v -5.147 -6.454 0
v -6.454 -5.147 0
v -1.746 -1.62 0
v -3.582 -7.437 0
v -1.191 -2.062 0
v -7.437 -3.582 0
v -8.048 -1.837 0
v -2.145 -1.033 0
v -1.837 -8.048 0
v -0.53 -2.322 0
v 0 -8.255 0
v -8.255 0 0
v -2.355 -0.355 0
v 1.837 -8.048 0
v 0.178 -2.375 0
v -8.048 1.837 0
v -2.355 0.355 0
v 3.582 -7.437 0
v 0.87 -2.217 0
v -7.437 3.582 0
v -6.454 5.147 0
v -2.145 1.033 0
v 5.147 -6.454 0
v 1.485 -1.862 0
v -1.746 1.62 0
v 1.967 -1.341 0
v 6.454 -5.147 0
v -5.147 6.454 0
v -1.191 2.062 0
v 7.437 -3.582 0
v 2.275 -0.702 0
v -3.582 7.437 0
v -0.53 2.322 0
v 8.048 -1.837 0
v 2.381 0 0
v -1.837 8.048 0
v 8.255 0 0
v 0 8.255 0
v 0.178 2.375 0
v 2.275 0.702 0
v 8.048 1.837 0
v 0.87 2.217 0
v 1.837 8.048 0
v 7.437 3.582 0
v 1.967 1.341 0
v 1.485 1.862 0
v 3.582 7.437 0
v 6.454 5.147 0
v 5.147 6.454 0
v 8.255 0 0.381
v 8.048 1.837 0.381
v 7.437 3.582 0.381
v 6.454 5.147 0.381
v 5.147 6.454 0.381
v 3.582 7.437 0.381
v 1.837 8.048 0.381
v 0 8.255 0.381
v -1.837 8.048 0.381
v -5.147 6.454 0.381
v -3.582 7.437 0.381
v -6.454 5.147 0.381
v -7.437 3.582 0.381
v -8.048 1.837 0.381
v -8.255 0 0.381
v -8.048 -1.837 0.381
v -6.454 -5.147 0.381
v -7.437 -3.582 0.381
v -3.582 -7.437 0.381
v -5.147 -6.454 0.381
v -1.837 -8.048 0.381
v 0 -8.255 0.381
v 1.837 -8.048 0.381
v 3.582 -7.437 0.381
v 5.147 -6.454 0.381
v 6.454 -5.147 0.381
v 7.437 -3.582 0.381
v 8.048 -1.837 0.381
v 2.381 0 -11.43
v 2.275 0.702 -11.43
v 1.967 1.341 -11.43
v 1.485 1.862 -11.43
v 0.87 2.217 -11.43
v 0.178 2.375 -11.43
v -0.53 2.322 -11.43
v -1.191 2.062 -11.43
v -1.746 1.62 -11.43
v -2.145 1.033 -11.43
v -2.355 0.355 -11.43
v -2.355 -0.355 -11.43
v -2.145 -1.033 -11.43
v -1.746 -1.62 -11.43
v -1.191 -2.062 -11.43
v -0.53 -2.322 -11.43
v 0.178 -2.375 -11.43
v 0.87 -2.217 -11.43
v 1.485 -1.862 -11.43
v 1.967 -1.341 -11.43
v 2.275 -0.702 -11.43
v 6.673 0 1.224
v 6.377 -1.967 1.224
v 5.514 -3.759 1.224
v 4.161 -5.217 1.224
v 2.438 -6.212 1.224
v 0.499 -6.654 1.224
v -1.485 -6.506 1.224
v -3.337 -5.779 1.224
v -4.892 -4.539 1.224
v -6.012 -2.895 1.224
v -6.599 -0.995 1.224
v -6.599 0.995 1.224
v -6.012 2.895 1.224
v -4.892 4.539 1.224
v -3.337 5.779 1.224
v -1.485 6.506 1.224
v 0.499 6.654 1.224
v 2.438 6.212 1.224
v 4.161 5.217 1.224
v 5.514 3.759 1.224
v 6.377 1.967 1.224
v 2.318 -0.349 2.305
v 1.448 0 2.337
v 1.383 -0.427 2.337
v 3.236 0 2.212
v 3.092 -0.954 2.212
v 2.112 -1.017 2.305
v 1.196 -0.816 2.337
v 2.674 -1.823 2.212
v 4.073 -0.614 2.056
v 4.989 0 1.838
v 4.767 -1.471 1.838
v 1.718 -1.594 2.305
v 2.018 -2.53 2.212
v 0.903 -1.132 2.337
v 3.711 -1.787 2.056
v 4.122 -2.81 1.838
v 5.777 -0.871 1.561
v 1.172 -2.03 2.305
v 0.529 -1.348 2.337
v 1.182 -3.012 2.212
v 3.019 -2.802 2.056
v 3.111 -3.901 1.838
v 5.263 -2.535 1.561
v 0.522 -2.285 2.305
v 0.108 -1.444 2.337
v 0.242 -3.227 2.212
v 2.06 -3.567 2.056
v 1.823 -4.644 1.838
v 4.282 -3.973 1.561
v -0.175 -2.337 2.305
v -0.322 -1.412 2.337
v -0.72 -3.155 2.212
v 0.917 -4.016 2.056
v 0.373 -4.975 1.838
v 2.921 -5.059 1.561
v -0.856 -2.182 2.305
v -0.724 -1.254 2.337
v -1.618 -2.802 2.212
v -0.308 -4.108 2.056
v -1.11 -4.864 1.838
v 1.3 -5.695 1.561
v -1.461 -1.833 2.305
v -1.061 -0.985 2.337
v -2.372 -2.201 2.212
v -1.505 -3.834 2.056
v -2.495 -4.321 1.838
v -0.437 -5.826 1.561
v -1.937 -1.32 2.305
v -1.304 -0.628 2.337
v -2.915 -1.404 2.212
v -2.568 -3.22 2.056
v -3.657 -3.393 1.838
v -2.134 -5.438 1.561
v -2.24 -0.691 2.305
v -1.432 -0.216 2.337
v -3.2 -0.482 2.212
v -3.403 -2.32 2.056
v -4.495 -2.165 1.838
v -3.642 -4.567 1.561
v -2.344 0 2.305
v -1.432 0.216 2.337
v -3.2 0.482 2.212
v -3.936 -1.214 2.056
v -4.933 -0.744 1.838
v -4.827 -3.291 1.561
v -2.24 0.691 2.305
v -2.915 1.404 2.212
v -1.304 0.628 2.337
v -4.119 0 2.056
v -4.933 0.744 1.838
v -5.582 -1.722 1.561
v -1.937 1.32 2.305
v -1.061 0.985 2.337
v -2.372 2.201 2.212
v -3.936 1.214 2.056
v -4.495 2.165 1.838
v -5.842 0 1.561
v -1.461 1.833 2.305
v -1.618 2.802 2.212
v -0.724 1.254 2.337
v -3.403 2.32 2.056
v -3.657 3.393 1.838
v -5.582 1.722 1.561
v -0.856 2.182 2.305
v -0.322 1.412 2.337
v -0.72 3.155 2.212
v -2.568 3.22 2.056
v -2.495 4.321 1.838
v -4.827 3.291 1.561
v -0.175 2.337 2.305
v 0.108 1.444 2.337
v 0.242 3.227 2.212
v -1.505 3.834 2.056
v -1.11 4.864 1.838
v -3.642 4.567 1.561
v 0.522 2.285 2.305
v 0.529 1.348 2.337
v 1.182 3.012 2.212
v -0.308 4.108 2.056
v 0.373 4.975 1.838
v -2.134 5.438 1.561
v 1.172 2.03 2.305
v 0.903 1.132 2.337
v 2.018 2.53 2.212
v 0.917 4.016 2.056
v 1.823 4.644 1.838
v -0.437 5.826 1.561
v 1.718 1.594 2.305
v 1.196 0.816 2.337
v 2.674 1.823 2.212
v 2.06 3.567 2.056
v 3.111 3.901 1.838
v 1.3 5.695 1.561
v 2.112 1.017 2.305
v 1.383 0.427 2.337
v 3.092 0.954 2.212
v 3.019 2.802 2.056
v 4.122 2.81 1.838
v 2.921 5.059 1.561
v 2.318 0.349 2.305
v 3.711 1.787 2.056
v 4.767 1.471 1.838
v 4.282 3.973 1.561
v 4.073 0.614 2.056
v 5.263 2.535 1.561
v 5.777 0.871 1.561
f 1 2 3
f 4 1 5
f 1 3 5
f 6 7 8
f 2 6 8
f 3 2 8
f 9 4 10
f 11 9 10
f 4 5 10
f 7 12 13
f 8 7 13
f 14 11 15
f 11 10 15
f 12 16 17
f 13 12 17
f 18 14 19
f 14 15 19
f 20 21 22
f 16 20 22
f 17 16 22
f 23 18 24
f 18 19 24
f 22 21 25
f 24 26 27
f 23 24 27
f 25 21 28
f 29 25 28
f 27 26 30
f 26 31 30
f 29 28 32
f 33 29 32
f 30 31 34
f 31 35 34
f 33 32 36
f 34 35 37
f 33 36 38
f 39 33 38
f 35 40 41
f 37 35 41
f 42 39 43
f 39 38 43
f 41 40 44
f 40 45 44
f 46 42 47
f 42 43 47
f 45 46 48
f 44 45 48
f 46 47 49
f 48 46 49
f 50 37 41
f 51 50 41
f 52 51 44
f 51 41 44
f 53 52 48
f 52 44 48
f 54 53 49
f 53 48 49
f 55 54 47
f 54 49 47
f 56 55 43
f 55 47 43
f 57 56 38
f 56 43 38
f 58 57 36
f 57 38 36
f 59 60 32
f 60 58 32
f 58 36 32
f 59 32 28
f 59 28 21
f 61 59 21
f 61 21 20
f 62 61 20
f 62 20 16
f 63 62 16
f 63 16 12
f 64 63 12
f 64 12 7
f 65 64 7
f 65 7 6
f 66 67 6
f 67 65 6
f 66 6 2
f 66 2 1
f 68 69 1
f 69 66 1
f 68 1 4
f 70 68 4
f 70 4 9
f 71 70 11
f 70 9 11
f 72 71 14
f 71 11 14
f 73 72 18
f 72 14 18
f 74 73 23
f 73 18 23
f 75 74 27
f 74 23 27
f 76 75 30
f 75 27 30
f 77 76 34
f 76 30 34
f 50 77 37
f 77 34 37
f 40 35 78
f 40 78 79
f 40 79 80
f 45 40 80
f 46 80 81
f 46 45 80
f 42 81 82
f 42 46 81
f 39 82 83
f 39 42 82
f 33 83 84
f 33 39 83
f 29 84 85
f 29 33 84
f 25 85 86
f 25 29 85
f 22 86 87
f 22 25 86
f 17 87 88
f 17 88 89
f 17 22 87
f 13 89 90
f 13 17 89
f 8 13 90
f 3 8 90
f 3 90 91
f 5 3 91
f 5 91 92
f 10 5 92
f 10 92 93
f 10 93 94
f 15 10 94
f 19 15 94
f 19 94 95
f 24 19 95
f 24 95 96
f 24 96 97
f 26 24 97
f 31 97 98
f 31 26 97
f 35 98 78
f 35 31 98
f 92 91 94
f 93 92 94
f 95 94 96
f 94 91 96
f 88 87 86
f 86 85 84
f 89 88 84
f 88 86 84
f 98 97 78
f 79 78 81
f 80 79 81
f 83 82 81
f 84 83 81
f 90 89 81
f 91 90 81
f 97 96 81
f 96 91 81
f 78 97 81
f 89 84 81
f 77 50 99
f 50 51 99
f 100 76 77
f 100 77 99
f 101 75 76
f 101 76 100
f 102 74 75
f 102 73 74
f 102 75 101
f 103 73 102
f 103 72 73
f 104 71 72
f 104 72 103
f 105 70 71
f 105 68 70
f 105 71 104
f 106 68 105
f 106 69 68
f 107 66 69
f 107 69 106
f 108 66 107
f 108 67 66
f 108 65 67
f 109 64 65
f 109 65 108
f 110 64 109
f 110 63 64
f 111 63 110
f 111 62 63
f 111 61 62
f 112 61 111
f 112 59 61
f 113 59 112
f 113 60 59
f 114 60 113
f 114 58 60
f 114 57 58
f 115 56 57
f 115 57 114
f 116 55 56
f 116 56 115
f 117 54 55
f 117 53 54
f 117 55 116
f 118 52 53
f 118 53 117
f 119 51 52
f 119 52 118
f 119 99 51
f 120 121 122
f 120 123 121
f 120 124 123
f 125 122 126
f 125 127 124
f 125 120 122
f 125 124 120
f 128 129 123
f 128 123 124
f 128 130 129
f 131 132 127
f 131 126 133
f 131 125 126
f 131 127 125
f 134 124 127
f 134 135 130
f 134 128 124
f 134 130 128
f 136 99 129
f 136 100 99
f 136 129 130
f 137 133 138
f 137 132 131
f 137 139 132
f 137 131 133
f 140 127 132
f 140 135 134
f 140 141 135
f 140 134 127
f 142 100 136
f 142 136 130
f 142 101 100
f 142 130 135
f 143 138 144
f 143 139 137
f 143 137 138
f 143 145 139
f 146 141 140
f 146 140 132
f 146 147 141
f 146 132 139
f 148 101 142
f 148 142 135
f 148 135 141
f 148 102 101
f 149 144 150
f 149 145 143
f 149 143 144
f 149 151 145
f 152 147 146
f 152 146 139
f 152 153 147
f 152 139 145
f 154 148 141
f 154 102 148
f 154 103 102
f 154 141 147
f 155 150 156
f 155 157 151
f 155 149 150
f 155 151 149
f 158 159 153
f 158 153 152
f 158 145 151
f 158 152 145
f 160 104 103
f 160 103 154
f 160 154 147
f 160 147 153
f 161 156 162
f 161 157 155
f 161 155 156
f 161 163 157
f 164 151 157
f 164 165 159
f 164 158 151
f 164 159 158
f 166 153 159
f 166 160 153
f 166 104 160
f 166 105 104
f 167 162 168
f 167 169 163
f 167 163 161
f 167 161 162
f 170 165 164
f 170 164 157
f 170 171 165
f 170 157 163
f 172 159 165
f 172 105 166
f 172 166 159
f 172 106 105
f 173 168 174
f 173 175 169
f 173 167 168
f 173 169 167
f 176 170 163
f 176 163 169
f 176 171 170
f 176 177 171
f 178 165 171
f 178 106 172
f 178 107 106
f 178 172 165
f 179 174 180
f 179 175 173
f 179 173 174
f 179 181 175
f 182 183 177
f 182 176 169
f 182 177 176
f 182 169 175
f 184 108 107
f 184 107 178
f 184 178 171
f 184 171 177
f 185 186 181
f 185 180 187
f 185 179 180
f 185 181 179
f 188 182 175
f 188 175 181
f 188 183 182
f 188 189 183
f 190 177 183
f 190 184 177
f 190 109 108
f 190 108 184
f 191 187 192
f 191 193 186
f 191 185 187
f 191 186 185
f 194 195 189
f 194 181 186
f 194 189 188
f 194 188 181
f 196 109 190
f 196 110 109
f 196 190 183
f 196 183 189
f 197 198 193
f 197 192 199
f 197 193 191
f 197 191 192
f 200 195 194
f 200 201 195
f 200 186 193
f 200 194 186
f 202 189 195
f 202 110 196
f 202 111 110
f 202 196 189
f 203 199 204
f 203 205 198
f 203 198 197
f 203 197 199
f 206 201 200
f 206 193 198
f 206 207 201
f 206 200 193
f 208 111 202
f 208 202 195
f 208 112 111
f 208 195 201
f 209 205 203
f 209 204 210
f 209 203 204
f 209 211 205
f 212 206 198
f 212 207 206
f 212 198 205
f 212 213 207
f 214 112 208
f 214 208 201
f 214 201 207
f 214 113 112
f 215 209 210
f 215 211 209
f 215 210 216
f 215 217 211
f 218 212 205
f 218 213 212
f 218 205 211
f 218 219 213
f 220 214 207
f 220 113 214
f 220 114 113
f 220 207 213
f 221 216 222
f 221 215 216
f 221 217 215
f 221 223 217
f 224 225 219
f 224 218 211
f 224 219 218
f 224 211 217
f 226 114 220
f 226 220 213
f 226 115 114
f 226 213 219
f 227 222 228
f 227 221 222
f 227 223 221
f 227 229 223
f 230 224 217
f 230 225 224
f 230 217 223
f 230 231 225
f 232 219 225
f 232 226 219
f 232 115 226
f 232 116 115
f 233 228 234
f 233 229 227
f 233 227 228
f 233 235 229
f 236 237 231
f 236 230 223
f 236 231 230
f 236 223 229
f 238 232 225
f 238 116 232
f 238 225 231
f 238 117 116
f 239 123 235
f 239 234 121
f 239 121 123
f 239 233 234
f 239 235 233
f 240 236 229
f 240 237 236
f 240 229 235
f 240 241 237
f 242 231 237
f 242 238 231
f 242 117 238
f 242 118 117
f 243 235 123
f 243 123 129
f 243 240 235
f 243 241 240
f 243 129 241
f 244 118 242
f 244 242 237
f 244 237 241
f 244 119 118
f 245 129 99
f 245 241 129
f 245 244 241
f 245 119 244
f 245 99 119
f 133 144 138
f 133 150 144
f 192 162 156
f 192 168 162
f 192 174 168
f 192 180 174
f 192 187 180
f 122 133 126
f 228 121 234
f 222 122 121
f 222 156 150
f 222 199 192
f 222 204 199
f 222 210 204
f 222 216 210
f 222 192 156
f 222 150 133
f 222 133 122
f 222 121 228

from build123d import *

# Parameters (mm, degrees)
SKETCH1_R           = 8.255
BOSS_EXTRUDE1_DEPTH = 2.3368
SKETCH2_R           = 2.38125
BOSS_EXTRUDE2_DEPTH = 11.43


with BuildPart() as part:
    # Sketch1 → Boss-Extrude1 (new body)
    with BuildSketch(Plane.XY):
        Circle(SKETCH1_R)
    extrude(amount=BOSS_EXTRUDE1_DEPTH)

    # Sketch2 → Boss-Extrude2 (add)
    with BuildSketch(Plane.XY):
        Circle(SKETCH2_R)
    extrude(amount=-BOSS_EXTRUDE2_DEPTH)

    # Sketch3 → Cut-Revolve1 (revolve, cut)
    with BuildSketch(Plane(origin=(0, 0, 0), x_dir=(1, 0, 0), z_dir=(0, 1, 0))):
        with BuildLine():
            ThreePointArc((1.4478, -2.3368), (4.989096566, -1.838155581), (8.255, -0.381))
            Line((8.255, -0.381), (8.255, -2.3368))
            Line((8.255, -2.3368), (1.4478, -2.3368))
        make_face()
    revolve(axis=Axis((0, 0, 2.3368), (0, 0, -1)), mode=Mode.SUBTRACT)


solid = part.part
